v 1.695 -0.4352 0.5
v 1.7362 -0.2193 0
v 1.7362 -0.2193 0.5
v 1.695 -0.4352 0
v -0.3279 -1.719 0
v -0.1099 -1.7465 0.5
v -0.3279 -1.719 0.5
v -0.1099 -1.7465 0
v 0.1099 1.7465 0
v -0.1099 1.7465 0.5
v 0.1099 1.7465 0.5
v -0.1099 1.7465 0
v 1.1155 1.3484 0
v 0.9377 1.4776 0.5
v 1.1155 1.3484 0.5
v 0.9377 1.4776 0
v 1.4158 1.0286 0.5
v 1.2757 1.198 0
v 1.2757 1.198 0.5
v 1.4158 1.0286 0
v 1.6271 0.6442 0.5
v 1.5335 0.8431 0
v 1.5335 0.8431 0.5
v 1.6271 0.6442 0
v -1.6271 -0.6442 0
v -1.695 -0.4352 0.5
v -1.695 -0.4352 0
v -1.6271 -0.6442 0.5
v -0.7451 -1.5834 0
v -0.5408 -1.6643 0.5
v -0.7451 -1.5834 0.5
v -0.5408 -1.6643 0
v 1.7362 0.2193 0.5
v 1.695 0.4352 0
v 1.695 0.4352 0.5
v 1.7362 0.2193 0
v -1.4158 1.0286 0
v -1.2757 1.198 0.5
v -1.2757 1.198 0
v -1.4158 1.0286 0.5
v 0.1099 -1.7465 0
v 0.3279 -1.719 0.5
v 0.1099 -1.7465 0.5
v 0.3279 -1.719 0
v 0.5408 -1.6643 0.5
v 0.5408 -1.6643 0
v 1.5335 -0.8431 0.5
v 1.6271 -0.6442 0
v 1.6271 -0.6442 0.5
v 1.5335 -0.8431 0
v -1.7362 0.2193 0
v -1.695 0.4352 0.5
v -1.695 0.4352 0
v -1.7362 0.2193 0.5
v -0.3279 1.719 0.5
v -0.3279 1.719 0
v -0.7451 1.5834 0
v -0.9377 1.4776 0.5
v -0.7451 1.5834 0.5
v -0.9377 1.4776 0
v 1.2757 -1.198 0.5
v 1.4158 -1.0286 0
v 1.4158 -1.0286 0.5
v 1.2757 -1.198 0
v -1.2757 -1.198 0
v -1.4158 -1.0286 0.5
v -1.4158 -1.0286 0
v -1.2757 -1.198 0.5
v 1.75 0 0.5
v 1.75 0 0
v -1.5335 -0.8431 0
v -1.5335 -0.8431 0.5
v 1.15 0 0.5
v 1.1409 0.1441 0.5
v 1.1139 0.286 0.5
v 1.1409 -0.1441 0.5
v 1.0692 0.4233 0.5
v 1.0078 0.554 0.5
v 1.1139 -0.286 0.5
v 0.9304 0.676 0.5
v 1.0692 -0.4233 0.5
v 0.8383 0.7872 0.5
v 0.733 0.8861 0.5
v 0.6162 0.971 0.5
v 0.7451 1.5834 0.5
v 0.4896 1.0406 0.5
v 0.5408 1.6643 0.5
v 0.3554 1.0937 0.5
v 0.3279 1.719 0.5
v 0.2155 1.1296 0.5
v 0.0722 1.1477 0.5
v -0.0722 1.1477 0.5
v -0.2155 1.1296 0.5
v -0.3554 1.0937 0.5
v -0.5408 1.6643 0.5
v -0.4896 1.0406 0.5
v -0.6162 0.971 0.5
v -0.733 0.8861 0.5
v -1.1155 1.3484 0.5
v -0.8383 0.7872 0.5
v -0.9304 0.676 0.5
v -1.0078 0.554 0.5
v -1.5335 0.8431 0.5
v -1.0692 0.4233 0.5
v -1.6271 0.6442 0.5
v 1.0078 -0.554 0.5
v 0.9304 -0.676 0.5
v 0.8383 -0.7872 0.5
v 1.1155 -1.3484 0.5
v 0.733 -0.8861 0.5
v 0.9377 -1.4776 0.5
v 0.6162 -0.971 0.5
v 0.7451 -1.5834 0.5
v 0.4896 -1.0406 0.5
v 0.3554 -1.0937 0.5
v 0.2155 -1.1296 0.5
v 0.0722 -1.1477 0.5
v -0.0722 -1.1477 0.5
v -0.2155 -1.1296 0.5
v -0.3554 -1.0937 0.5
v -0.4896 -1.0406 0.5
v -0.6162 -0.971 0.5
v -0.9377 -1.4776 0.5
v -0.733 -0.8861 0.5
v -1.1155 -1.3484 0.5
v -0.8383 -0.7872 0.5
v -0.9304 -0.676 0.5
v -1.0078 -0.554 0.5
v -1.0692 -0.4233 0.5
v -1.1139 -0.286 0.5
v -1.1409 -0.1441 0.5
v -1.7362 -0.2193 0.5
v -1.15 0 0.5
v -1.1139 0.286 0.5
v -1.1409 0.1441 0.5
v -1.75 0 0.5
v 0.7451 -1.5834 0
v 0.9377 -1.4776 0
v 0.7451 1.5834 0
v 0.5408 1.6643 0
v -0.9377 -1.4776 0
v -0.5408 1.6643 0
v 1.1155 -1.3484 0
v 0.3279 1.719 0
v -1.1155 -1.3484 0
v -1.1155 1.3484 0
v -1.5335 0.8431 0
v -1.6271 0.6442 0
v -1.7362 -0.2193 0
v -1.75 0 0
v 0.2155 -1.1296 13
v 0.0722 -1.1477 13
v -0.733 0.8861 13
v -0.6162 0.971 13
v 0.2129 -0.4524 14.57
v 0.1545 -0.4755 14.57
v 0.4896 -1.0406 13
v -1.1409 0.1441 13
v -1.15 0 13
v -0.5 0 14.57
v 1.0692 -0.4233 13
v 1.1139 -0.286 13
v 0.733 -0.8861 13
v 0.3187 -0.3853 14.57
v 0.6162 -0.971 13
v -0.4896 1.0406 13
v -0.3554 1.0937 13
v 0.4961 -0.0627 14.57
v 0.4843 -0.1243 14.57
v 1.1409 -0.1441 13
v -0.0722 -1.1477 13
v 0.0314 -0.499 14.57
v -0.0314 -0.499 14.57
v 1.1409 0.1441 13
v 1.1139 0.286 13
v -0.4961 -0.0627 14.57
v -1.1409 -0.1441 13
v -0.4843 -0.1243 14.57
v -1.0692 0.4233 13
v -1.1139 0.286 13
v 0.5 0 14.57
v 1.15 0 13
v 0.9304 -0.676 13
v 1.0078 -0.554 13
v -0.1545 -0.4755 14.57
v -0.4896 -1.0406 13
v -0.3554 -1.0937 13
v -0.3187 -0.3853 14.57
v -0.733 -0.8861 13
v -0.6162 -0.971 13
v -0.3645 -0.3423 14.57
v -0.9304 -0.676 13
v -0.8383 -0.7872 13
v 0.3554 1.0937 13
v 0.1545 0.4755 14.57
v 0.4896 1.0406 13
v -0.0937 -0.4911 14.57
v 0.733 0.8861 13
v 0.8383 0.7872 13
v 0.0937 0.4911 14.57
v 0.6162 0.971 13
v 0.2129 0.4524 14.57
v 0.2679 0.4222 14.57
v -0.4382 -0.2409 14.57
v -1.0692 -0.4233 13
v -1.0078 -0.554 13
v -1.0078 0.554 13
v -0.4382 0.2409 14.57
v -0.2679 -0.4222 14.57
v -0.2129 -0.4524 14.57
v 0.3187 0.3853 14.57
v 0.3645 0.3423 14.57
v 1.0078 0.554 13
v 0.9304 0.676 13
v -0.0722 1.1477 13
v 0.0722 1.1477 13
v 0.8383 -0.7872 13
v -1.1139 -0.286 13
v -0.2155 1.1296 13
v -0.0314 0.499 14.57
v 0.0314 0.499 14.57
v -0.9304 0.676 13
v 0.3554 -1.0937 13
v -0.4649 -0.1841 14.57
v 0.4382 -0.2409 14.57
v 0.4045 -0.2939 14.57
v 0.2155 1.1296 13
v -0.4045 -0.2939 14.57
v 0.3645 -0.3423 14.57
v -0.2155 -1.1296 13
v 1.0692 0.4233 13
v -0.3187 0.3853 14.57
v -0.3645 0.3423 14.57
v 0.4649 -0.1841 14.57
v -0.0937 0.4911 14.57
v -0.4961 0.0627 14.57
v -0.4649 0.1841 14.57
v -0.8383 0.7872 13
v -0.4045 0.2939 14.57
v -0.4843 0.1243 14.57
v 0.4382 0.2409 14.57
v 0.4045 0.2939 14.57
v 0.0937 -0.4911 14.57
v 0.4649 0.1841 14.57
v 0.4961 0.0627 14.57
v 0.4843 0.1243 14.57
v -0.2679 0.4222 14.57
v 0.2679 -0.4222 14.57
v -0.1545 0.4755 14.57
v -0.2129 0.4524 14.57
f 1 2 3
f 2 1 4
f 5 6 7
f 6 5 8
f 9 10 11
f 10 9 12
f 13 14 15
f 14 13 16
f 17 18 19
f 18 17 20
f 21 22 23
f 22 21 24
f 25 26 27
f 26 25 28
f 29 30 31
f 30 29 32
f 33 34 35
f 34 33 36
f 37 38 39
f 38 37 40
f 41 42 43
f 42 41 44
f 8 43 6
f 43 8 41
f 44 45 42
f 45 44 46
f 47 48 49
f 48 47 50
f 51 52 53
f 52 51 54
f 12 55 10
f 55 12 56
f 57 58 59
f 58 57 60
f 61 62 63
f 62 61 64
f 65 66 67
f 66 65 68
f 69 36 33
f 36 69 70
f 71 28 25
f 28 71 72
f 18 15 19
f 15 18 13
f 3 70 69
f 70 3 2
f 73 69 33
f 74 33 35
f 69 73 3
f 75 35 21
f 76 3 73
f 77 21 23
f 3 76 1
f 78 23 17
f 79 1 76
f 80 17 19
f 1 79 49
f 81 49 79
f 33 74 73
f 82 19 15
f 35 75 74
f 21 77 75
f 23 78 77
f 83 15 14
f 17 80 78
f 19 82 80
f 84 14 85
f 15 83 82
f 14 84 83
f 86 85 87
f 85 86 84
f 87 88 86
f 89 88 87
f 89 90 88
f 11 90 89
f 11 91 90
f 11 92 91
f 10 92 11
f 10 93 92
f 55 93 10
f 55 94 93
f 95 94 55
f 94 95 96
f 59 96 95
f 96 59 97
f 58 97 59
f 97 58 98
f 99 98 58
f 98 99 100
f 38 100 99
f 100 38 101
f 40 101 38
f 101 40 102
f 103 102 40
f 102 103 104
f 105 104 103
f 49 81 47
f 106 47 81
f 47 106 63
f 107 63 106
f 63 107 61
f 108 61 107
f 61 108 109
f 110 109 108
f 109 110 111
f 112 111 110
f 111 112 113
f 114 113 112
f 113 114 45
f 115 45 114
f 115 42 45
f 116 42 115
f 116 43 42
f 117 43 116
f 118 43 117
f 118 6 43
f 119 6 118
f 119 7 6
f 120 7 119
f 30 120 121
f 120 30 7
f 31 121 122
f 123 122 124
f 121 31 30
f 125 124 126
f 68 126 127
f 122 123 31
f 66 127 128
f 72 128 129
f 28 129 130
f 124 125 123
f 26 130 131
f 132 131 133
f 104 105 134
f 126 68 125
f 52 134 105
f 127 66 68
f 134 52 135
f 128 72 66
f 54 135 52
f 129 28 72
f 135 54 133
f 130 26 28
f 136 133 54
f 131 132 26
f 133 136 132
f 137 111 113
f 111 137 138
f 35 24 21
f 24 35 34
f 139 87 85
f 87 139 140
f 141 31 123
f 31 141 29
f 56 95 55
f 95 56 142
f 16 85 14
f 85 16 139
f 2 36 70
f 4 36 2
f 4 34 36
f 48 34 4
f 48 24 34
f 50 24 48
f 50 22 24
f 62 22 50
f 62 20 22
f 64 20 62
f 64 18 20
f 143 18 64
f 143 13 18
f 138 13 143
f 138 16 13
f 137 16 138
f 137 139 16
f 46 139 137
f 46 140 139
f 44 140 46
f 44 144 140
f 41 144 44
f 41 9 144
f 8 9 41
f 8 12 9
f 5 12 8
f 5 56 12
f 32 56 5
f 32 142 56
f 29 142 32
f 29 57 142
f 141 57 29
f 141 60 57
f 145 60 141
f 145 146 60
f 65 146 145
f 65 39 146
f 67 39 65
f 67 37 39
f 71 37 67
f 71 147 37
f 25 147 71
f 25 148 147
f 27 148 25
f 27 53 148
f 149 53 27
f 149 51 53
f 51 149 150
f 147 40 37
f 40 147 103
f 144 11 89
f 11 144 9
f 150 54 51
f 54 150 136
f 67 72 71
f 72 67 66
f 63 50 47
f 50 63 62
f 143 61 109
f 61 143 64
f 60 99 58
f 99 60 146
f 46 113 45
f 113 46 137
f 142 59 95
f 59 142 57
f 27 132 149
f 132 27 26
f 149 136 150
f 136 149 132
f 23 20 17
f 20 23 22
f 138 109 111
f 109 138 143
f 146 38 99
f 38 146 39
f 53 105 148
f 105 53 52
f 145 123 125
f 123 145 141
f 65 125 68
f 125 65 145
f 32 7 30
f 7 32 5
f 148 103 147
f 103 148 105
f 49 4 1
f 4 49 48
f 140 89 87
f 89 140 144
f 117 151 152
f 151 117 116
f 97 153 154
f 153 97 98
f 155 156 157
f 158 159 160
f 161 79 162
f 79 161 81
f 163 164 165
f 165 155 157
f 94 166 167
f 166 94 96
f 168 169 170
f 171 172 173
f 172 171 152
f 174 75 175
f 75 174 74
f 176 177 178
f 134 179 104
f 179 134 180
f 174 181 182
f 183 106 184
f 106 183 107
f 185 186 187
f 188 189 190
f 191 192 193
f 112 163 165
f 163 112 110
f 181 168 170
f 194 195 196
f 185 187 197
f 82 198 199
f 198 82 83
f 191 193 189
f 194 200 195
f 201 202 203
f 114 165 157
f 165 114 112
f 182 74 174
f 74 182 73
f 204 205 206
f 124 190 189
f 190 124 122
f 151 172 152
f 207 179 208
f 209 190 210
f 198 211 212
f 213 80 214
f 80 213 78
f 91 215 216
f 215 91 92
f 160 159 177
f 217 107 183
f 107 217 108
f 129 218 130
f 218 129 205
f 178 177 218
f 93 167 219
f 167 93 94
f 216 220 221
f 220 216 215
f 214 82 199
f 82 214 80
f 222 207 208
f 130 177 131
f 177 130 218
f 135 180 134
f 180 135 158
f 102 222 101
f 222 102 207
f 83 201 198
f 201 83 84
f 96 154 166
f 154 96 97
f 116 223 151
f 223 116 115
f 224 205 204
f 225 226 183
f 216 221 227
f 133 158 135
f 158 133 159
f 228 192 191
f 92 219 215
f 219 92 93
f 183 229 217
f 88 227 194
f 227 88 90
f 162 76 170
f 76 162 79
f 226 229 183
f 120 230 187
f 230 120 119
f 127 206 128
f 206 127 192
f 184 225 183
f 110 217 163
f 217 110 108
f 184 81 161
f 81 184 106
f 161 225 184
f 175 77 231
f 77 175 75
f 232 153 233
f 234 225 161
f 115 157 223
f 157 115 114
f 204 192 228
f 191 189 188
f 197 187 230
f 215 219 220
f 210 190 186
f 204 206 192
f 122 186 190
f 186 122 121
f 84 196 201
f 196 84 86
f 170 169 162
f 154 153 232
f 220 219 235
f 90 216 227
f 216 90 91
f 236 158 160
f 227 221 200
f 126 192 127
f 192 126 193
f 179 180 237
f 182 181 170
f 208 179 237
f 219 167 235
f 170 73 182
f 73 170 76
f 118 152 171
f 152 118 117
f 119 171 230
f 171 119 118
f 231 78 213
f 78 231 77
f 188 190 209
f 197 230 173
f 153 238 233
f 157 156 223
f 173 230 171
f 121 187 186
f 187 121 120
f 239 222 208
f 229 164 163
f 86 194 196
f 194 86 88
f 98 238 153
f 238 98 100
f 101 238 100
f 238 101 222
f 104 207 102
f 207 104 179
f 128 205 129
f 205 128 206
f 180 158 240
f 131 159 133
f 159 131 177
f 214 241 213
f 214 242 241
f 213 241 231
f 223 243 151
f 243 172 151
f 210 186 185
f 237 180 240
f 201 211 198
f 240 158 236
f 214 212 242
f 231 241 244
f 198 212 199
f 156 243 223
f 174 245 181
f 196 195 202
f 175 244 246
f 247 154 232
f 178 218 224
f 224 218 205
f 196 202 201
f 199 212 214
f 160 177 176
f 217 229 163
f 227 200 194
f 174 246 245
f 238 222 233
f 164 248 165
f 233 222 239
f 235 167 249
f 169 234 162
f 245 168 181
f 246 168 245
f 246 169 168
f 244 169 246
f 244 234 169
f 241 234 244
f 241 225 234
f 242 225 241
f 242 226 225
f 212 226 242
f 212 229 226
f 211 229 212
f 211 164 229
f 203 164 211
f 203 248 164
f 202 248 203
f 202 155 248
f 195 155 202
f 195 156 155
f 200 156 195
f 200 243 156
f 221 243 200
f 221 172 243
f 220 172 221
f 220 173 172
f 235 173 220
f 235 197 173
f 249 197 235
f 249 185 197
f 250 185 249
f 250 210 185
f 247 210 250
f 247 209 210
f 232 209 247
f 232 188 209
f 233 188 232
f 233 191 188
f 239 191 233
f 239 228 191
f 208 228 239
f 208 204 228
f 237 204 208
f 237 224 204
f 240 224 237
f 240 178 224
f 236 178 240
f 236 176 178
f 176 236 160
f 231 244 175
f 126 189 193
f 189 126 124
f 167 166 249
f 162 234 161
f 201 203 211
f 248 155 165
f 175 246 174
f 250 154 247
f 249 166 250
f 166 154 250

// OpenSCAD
// file: util/standoff.scad
$fn = 50;

standoff(height=3, board_size=1.57);

translate([20, 20])
positive_standoff(height=3, board_size=1.57);


color("white")
translate([0, 0, 5.4])
mirror([0, 0, 1])
standoff_pin(height=3, board_size=1.57);

module standoff(height, board_size) {
  difference() {
    union() {
      cylinder(h=height, d=3.5);
    }

    translate([0, 0, .2])
    cylinder(h=height + board_size, d=2.1);

  }
  fillet(width=3.5, r=2);
}

module positive_standoff(height, board_size) {
  union() {
    cylinder(h=height, d=3.5);
    cylinder(h=height + board_size, d=2.5);
  }
  fillet(width=3.5, r=2);
}

module standoff_pin(height, board_size) {
  cylinder(h=0.5, d=3.5);
  hull() {
    cylinder(h=height, d=2.3);

    translate([0, 0, height + board_size - 0.1])
    cylinder(h=0.1, d=1);
  }
}

module fillet(width, r) {
  rotate_extrude()
  translate([width/2, 0])
  difference() {
    square(r);

    translate([r, r])
    circle(r);
  }
}
// main file
use <util/standoff.scad>;

standoff_pin(height=13, board_size=1.57);
